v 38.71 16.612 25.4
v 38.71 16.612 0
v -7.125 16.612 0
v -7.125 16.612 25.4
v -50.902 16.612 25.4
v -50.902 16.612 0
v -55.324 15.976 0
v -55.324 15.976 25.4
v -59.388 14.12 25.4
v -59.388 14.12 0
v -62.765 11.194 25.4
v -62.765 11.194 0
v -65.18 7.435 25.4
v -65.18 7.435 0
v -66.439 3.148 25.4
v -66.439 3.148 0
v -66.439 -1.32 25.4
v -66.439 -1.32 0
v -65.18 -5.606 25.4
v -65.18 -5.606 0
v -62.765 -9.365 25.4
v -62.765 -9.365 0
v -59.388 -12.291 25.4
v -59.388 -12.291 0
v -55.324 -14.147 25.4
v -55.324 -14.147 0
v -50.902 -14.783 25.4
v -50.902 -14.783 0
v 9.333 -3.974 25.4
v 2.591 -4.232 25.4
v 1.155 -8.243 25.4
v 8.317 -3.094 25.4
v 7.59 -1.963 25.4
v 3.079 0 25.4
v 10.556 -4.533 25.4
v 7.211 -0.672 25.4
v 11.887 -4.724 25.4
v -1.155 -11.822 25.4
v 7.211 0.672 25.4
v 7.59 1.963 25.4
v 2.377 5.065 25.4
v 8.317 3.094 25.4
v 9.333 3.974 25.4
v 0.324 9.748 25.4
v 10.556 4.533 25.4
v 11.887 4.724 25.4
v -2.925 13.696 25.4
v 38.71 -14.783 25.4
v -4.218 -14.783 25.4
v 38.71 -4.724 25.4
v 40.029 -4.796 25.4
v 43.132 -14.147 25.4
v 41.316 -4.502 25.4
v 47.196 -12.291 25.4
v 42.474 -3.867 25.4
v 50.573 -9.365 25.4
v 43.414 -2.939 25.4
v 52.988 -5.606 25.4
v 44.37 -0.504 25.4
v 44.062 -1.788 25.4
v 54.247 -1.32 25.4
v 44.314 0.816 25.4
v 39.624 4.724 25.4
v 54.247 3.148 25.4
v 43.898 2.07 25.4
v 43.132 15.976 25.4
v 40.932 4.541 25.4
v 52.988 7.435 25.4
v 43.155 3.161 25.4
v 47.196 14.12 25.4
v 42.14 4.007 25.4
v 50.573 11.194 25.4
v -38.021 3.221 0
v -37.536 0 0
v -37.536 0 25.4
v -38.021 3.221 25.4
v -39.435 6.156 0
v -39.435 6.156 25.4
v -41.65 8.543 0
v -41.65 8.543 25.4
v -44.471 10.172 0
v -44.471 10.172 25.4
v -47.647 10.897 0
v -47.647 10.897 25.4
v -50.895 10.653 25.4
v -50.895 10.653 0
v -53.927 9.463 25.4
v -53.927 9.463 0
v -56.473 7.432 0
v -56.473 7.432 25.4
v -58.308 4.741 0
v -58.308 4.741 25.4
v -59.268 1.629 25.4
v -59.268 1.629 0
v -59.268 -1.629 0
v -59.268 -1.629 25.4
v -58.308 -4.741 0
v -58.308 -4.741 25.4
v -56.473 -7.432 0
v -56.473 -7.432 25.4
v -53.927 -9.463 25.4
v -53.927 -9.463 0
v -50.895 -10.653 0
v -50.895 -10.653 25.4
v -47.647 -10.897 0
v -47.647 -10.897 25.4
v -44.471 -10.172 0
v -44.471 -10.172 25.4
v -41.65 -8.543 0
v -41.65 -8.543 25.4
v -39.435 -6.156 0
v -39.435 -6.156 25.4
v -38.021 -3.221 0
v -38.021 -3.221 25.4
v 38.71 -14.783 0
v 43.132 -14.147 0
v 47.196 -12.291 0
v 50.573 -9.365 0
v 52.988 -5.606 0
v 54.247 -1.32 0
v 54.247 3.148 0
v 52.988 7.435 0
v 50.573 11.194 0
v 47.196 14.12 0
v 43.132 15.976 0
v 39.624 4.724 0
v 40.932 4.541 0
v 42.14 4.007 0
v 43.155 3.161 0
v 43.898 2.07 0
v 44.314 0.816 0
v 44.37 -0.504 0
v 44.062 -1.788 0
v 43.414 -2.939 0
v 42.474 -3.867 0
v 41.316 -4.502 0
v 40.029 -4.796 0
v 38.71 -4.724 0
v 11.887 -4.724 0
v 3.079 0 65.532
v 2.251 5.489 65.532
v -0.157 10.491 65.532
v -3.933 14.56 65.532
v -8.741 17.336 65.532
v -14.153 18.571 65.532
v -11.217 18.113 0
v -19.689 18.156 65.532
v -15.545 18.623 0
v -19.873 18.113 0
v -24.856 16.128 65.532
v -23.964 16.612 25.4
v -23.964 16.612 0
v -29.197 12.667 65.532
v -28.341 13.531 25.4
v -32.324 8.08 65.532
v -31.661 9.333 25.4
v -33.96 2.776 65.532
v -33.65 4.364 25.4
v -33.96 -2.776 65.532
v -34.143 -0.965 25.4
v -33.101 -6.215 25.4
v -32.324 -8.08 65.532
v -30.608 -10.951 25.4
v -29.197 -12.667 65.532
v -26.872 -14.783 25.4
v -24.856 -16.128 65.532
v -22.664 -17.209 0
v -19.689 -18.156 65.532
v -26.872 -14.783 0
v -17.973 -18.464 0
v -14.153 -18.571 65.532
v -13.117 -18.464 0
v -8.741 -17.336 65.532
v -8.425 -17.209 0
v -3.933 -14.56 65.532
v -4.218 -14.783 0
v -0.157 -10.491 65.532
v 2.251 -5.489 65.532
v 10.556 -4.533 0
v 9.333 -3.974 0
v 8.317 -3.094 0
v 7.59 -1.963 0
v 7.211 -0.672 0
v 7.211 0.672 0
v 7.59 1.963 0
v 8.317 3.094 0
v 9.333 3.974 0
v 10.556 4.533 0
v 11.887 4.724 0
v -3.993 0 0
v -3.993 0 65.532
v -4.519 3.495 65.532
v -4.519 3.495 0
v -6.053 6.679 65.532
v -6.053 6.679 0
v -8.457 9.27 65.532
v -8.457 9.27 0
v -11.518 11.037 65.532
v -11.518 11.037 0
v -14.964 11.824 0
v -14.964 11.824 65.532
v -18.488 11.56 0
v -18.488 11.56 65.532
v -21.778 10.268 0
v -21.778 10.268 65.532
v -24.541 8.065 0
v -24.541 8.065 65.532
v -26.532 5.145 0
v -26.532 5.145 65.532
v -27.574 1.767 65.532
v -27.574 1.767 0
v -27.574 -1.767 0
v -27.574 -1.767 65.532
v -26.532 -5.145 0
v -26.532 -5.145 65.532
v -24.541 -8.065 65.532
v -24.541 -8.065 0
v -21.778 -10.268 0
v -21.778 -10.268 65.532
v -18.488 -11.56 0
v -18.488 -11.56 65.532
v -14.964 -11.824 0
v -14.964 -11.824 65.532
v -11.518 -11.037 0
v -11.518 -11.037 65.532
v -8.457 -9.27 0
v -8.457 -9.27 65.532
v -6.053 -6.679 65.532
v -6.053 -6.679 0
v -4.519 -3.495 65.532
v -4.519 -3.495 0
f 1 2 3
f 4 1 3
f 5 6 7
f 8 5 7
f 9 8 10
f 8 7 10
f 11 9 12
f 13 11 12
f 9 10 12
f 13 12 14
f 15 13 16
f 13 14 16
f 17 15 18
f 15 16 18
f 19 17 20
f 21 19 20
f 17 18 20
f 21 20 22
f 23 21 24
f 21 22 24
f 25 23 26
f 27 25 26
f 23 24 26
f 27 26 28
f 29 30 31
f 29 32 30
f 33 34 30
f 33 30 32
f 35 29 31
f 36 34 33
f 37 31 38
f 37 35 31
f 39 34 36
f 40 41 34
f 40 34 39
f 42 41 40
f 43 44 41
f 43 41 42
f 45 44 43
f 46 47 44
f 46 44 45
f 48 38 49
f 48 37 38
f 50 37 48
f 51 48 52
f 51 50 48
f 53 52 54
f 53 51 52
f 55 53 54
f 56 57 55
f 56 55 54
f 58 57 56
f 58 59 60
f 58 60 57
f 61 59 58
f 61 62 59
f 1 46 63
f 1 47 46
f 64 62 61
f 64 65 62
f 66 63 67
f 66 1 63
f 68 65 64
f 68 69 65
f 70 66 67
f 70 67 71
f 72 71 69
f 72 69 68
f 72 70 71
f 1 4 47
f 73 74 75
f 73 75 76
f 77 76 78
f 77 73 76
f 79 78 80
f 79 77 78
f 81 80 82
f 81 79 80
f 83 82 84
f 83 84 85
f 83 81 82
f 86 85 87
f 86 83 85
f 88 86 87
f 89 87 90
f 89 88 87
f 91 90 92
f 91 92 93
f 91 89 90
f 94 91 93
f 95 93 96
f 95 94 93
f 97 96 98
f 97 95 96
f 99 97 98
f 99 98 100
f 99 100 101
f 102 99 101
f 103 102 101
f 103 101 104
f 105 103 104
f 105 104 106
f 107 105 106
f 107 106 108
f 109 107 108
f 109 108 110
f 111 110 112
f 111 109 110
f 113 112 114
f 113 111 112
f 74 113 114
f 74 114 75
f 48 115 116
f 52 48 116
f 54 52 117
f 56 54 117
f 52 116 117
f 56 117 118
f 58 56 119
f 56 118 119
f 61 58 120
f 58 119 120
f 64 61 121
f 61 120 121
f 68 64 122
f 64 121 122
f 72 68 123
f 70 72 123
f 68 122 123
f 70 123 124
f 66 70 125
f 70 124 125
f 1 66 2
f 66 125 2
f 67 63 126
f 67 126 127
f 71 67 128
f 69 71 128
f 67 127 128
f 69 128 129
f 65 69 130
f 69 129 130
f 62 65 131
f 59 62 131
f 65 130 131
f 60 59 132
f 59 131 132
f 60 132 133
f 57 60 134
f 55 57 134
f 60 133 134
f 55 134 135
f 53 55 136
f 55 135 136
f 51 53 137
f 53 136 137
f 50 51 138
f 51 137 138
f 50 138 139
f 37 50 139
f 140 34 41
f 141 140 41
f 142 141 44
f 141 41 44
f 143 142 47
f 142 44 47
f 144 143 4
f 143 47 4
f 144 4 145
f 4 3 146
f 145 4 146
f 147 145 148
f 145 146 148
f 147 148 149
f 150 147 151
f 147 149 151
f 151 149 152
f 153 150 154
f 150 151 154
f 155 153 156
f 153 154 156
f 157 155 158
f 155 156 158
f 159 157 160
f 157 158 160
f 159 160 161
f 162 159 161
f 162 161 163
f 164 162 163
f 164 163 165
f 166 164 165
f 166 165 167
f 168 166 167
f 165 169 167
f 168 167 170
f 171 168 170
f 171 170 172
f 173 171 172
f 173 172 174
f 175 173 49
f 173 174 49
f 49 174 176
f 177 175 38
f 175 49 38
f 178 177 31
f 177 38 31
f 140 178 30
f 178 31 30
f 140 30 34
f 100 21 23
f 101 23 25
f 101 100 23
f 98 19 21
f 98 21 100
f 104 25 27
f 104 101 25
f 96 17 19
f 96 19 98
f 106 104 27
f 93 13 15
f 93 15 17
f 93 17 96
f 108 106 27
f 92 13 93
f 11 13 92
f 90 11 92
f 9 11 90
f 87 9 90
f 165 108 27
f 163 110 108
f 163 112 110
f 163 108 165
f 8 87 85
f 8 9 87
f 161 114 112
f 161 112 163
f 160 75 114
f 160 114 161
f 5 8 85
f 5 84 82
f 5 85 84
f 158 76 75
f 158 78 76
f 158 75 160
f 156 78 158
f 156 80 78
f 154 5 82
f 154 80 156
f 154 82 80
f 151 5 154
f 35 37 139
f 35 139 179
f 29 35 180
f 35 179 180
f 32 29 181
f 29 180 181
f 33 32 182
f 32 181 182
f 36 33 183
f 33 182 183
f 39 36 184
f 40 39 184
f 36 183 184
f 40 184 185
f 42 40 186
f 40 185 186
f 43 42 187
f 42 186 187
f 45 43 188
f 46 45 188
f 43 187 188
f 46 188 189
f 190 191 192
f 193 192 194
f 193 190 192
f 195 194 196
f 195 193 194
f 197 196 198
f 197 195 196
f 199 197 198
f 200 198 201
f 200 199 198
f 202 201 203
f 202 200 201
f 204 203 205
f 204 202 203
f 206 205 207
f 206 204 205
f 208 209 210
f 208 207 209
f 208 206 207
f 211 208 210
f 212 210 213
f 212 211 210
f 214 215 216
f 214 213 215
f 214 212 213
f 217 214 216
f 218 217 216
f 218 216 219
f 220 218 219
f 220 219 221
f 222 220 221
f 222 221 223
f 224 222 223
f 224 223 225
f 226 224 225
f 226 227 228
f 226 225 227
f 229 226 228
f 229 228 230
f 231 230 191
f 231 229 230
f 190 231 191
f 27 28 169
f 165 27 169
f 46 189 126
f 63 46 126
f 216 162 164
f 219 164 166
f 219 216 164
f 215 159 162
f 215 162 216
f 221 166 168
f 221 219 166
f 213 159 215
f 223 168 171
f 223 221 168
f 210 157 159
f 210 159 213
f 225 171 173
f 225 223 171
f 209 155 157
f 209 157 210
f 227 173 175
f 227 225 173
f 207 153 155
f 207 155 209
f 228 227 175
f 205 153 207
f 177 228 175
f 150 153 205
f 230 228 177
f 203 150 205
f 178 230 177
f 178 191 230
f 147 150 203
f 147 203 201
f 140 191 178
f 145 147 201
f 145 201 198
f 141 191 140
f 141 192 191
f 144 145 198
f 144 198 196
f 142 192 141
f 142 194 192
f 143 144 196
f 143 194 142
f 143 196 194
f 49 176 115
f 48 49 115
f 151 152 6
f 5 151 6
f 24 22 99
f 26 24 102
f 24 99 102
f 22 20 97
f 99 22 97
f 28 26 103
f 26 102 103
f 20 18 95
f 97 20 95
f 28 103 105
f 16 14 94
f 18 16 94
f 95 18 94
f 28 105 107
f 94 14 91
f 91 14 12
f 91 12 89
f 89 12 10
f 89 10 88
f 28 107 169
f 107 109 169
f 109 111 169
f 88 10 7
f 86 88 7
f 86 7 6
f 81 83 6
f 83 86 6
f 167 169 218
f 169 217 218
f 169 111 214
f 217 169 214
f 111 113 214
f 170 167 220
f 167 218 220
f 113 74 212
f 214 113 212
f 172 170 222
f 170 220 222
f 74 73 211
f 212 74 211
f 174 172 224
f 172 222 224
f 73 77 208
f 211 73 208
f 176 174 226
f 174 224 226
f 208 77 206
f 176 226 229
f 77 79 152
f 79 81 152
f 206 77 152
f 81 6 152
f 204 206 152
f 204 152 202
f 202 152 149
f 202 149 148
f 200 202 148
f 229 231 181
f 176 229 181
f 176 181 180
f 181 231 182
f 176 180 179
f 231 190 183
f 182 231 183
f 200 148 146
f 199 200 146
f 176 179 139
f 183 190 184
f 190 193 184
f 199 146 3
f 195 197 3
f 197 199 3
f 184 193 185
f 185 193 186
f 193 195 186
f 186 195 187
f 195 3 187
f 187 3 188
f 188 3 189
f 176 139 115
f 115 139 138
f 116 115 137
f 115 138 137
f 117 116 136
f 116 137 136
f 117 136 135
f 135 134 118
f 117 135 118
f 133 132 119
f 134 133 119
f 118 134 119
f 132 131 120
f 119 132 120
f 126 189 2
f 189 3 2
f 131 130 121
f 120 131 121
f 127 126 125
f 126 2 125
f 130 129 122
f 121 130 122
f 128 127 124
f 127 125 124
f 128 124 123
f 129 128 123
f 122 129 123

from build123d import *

# Parameters (mm, degrees)
F0_R     = 10.927197
F2_DEPTH = 25.4
F1_R     = 18.62338
F3_DEPTH = 65.532
F4_R     = 11.856878
F5_DEPTH = 104.902


with BuildPart() as f2:
    # F0 (on Top) → F2 (new body)
    with BuildSketch(Plane.XY):
        with BuildLine():
            Line((-50.901599, -14.7828), (38.709603, -14.7828))
            ThreePointArc((38.709603, -14.7828), (54.406804, 0.9144), (38.709603, 16.6116))
            Line((38.709603, 16.6116), (-50.901599, 16.6116))
            ThreePointArc((-50.901599, 16.6116), (-66.5988, 0.9144), (-50.901599, -14.7828))
        make_face()
        with Locations((-48.463199, 0)):
            Circle(F0_R, mode=Mode.SUBTRACT)
        with BuildLine():
            ThreePointArc((11.887199, -4.7244), (7.162799, 0), (11.887199, 4.7244))
            Line((11.887199, 4.7244), (39.624002, 4.7244))
            ThreePointArc((39.624002, 4.7244), (44.370473, -0.50358), (38.709603, -4.7244))
            Line((38.709603, -4.7244), (11.887199, -4.7244))
        make_face(mode=Mode.SUBTRACT)
    extrude(amount=F2_DEPTH)

    # F1 (on Top) → F3 (join)
    with BuildSketch(Plane.XY):
        with Locations((-15.544801, 0)):
            Circle(F1_R)
    extrude(amount=F3_DEPTH)

    # F4 (on Top) → F5 (cut)
    with BuildSketch(Plane.XY):
        with Locations((-15.849601, 0)):
            Circle(F4_R)
    extrude(amount=F5_DEPTH, mode=Mode.SUBTRACT)


solid = f2.part
